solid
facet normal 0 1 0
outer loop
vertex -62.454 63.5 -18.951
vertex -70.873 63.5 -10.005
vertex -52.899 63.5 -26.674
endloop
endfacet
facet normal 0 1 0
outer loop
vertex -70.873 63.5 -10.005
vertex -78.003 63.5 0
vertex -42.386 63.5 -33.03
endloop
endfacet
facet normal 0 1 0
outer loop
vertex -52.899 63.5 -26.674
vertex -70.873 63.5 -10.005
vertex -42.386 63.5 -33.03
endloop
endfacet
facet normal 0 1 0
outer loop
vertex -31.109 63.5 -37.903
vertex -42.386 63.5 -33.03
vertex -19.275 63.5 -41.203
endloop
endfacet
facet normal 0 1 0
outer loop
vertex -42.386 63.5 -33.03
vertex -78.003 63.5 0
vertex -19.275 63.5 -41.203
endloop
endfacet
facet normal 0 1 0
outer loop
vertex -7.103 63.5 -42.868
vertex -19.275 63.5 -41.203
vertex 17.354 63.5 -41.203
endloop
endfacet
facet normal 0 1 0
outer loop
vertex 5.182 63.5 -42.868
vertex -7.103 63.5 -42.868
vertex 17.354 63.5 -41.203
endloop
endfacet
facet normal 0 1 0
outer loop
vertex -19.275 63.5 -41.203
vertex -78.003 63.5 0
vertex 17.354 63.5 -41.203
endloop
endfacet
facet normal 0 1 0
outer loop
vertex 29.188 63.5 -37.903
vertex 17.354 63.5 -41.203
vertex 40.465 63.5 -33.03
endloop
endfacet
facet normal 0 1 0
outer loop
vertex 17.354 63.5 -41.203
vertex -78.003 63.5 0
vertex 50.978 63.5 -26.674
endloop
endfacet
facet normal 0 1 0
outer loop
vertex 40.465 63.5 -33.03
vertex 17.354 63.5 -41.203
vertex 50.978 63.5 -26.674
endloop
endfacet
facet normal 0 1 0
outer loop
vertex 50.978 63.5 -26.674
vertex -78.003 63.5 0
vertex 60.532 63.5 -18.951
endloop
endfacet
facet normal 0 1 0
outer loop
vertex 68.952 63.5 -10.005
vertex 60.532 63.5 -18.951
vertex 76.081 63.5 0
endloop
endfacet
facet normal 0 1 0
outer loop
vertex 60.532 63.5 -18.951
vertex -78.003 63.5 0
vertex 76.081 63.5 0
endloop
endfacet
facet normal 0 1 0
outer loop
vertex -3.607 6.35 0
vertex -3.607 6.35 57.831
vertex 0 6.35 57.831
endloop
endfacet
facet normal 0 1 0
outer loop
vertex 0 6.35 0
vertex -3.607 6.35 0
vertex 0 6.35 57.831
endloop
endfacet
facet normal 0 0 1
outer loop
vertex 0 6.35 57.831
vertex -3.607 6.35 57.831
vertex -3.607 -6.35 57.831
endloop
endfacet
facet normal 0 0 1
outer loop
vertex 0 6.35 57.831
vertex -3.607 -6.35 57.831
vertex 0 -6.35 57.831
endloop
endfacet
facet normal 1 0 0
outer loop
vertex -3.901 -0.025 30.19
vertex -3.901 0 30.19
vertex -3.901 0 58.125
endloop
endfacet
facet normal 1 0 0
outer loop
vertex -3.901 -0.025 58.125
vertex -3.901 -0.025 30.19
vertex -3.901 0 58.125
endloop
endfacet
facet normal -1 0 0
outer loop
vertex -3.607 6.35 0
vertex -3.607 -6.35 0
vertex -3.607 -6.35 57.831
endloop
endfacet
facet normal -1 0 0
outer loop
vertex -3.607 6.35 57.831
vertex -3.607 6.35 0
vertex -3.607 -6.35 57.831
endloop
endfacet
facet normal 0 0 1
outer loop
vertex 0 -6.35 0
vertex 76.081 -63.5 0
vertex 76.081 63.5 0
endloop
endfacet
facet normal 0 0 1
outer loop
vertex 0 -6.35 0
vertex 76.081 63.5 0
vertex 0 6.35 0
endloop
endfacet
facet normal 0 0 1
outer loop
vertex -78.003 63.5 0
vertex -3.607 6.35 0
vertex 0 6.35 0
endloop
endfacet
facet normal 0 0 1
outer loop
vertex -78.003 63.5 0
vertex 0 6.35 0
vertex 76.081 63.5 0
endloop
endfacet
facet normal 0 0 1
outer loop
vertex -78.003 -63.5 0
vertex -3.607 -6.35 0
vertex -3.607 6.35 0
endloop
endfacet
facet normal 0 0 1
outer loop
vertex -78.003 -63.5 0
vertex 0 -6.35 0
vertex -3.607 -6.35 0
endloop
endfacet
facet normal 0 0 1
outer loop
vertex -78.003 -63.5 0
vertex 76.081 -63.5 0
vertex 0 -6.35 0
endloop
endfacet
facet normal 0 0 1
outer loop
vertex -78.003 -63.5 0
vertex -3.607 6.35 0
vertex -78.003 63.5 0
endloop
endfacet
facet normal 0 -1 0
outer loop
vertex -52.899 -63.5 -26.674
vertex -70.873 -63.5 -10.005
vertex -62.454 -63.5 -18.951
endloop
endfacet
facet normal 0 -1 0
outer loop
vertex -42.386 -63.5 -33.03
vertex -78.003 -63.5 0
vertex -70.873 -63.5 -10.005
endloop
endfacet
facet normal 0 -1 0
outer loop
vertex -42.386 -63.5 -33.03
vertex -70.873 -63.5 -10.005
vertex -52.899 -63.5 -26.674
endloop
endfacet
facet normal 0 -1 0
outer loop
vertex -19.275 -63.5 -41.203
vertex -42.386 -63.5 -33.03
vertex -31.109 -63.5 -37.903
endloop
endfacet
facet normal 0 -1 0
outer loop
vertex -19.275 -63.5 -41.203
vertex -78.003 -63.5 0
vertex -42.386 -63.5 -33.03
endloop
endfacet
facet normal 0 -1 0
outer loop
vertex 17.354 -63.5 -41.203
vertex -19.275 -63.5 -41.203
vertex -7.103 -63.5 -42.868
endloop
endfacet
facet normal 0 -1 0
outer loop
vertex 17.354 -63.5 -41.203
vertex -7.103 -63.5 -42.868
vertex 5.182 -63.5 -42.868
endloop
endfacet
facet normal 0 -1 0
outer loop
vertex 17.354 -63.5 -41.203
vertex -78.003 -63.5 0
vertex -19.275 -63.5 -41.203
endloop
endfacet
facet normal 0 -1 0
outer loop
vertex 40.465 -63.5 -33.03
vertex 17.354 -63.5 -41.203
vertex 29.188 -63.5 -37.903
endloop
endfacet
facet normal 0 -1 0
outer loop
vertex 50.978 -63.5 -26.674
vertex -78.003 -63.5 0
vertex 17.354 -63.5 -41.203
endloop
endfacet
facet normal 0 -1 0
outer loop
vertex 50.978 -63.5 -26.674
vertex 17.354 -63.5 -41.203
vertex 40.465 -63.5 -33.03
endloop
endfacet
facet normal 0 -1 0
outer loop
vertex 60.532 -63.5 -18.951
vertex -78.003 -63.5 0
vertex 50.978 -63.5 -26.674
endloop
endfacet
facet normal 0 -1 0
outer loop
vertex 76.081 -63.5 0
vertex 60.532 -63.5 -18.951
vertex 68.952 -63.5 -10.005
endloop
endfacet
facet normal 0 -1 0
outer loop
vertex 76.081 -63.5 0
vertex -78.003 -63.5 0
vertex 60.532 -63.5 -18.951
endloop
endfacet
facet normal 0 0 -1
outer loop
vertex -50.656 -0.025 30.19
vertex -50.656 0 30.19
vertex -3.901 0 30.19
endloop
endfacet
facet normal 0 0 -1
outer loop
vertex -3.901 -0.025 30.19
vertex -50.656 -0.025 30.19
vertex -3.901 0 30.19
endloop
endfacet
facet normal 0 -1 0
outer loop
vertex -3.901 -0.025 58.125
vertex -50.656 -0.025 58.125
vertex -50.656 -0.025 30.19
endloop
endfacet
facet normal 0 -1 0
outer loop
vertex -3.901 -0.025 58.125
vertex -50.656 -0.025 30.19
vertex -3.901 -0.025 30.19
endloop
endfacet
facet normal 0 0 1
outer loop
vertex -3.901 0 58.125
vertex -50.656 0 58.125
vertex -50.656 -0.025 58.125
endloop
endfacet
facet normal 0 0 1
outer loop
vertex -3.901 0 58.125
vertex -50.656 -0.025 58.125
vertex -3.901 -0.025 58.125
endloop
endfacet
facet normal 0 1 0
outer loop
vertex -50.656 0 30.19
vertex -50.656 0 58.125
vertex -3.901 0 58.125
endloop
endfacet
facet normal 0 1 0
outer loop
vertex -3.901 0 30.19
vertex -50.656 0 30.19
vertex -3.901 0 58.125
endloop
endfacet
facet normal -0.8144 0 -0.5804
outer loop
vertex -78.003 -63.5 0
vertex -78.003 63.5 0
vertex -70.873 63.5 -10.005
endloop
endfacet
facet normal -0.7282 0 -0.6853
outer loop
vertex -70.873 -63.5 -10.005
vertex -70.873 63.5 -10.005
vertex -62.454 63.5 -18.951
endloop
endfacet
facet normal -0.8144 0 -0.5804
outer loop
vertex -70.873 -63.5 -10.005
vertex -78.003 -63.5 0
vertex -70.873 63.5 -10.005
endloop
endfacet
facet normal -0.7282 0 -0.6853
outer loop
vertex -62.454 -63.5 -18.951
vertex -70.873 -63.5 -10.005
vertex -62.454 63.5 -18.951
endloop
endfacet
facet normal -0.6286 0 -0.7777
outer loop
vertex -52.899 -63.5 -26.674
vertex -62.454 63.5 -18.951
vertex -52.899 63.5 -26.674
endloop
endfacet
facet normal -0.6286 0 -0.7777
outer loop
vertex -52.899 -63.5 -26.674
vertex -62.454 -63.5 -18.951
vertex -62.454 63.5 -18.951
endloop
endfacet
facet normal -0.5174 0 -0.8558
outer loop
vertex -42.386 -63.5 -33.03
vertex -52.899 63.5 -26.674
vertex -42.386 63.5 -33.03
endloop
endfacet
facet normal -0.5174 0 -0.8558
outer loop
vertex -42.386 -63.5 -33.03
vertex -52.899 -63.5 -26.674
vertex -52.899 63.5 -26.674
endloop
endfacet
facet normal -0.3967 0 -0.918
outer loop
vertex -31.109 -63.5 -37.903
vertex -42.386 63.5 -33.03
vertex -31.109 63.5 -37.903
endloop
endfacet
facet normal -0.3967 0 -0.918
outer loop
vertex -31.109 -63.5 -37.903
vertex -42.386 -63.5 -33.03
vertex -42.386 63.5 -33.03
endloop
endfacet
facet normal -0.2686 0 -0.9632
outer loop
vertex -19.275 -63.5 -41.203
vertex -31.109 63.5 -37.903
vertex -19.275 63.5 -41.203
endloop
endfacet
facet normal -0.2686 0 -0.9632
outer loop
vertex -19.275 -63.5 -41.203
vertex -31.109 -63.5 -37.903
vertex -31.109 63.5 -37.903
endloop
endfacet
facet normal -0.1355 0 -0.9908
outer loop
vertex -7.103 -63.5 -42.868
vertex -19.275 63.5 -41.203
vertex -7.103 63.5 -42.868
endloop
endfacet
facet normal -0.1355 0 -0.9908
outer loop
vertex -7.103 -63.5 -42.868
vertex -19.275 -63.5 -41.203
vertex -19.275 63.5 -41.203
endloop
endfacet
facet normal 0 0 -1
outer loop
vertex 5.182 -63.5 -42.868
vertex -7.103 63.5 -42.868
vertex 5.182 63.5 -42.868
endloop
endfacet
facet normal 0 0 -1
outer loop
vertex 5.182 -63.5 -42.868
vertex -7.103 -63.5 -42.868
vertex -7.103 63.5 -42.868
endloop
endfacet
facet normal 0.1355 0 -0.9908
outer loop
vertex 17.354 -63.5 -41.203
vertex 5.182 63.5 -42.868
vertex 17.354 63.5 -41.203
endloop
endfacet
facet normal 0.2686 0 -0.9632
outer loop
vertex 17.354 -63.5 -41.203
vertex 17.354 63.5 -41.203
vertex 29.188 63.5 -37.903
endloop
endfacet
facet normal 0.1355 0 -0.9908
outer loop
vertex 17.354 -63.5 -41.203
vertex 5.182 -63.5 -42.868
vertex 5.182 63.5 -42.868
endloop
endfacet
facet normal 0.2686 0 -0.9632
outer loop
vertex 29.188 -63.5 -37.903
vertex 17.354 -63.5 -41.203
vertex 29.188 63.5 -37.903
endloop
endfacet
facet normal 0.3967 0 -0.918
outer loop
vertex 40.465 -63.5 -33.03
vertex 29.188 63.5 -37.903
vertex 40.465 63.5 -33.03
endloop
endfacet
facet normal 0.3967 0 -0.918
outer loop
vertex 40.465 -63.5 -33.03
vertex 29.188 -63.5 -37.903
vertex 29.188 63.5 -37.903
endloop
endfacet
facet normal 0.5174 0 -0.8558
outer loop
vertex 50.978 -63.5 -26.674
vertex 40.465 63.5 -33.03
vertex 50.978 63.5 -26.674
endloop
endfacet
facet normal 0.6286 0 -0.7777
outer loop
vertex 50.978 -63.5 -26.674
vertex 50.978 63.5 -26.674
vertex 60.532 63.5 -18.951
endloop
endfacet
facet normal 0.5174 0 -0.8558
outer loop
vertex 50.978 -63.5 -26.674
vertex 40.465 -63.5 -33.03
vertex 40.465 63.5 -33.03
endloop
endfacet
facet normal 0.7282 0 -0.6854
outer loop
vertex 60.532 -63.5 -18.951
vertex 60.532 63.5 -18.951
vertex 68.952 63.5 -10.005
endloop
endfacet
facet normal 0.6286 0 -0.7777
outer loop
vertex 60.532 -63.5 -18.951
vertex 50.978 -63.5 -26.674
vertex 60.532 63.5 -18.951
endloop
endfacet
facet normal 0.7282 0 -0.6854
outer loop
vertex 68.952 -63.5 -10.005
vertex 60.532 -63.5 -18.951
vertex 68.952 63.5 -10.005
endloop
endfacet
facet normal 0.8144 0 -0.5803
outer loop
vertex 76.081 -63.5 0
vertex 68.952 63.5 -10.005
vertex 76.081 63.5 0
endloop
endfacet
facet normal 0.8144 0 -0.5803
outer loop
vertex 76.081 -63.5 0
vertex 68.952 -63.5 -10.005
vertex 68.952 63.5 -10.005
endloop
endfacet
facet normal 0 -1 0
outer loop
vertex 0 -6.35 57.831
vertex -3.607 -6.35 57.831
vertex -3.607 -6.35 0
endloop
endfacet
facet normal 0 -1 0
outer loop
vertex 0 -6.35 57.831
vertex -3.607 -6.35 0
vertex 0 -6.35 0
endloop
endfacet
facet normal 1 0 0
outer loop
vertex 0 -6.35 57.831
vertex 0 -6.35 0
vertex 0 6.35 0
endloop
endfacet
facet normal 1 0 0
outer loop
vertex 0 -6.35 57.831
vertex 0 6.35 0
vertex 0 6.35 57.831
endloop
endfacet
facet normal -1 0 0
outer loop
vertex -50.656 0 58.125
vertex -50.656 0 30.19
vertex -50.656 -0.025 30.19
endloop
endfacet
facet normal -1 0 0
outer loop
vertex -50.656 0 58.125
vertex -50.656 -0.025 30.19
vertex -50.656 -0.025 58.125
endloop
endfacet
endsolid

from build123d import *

# Parameters (mm, degrees)
F3_DEPTH = 63.5
F2_W     = 46.754442
F2_H     = 27.935043
F4_DEPTH = 0.0254
F1_W     = 3.607231
F1_H     = 57.831373
F5_DEPTH = 6.35


with BuildPart() as f3:
    # F0 (on Front) → F3 (new body, symmetric)
    with BuildSketch(Plane.XZ):
        with BuildLine():
            Line((76.081164, 0), (-78.002669, 0))
            ThreePointArc((-78.002669, 0), (-0.960752, -43.076659), (76.081164, 0))
        make_face()
    extrude(amount=F3_DEPTH, both=True)

    # F1 (on Front) → F5 (join, symmetric)
    with BuildSketch(Plane.XZ):
        with Locations((-1.803615, 28.915686)):
            Rectangle(F1_W, F1_H)
    extrude(amount=F5_DEPTH, both=True)


with BuildPart() as f4:
    # F2 (on Front) → F4 (new body)
    with BuildSketch(Plane.XZ):
        with Locations((-27.278505, 44.157904)):
            Rectangle(F2_W, F2_H)
    extrude(amount=F4_DEPTH)


solid = Compound([f3.part, f4.part])
